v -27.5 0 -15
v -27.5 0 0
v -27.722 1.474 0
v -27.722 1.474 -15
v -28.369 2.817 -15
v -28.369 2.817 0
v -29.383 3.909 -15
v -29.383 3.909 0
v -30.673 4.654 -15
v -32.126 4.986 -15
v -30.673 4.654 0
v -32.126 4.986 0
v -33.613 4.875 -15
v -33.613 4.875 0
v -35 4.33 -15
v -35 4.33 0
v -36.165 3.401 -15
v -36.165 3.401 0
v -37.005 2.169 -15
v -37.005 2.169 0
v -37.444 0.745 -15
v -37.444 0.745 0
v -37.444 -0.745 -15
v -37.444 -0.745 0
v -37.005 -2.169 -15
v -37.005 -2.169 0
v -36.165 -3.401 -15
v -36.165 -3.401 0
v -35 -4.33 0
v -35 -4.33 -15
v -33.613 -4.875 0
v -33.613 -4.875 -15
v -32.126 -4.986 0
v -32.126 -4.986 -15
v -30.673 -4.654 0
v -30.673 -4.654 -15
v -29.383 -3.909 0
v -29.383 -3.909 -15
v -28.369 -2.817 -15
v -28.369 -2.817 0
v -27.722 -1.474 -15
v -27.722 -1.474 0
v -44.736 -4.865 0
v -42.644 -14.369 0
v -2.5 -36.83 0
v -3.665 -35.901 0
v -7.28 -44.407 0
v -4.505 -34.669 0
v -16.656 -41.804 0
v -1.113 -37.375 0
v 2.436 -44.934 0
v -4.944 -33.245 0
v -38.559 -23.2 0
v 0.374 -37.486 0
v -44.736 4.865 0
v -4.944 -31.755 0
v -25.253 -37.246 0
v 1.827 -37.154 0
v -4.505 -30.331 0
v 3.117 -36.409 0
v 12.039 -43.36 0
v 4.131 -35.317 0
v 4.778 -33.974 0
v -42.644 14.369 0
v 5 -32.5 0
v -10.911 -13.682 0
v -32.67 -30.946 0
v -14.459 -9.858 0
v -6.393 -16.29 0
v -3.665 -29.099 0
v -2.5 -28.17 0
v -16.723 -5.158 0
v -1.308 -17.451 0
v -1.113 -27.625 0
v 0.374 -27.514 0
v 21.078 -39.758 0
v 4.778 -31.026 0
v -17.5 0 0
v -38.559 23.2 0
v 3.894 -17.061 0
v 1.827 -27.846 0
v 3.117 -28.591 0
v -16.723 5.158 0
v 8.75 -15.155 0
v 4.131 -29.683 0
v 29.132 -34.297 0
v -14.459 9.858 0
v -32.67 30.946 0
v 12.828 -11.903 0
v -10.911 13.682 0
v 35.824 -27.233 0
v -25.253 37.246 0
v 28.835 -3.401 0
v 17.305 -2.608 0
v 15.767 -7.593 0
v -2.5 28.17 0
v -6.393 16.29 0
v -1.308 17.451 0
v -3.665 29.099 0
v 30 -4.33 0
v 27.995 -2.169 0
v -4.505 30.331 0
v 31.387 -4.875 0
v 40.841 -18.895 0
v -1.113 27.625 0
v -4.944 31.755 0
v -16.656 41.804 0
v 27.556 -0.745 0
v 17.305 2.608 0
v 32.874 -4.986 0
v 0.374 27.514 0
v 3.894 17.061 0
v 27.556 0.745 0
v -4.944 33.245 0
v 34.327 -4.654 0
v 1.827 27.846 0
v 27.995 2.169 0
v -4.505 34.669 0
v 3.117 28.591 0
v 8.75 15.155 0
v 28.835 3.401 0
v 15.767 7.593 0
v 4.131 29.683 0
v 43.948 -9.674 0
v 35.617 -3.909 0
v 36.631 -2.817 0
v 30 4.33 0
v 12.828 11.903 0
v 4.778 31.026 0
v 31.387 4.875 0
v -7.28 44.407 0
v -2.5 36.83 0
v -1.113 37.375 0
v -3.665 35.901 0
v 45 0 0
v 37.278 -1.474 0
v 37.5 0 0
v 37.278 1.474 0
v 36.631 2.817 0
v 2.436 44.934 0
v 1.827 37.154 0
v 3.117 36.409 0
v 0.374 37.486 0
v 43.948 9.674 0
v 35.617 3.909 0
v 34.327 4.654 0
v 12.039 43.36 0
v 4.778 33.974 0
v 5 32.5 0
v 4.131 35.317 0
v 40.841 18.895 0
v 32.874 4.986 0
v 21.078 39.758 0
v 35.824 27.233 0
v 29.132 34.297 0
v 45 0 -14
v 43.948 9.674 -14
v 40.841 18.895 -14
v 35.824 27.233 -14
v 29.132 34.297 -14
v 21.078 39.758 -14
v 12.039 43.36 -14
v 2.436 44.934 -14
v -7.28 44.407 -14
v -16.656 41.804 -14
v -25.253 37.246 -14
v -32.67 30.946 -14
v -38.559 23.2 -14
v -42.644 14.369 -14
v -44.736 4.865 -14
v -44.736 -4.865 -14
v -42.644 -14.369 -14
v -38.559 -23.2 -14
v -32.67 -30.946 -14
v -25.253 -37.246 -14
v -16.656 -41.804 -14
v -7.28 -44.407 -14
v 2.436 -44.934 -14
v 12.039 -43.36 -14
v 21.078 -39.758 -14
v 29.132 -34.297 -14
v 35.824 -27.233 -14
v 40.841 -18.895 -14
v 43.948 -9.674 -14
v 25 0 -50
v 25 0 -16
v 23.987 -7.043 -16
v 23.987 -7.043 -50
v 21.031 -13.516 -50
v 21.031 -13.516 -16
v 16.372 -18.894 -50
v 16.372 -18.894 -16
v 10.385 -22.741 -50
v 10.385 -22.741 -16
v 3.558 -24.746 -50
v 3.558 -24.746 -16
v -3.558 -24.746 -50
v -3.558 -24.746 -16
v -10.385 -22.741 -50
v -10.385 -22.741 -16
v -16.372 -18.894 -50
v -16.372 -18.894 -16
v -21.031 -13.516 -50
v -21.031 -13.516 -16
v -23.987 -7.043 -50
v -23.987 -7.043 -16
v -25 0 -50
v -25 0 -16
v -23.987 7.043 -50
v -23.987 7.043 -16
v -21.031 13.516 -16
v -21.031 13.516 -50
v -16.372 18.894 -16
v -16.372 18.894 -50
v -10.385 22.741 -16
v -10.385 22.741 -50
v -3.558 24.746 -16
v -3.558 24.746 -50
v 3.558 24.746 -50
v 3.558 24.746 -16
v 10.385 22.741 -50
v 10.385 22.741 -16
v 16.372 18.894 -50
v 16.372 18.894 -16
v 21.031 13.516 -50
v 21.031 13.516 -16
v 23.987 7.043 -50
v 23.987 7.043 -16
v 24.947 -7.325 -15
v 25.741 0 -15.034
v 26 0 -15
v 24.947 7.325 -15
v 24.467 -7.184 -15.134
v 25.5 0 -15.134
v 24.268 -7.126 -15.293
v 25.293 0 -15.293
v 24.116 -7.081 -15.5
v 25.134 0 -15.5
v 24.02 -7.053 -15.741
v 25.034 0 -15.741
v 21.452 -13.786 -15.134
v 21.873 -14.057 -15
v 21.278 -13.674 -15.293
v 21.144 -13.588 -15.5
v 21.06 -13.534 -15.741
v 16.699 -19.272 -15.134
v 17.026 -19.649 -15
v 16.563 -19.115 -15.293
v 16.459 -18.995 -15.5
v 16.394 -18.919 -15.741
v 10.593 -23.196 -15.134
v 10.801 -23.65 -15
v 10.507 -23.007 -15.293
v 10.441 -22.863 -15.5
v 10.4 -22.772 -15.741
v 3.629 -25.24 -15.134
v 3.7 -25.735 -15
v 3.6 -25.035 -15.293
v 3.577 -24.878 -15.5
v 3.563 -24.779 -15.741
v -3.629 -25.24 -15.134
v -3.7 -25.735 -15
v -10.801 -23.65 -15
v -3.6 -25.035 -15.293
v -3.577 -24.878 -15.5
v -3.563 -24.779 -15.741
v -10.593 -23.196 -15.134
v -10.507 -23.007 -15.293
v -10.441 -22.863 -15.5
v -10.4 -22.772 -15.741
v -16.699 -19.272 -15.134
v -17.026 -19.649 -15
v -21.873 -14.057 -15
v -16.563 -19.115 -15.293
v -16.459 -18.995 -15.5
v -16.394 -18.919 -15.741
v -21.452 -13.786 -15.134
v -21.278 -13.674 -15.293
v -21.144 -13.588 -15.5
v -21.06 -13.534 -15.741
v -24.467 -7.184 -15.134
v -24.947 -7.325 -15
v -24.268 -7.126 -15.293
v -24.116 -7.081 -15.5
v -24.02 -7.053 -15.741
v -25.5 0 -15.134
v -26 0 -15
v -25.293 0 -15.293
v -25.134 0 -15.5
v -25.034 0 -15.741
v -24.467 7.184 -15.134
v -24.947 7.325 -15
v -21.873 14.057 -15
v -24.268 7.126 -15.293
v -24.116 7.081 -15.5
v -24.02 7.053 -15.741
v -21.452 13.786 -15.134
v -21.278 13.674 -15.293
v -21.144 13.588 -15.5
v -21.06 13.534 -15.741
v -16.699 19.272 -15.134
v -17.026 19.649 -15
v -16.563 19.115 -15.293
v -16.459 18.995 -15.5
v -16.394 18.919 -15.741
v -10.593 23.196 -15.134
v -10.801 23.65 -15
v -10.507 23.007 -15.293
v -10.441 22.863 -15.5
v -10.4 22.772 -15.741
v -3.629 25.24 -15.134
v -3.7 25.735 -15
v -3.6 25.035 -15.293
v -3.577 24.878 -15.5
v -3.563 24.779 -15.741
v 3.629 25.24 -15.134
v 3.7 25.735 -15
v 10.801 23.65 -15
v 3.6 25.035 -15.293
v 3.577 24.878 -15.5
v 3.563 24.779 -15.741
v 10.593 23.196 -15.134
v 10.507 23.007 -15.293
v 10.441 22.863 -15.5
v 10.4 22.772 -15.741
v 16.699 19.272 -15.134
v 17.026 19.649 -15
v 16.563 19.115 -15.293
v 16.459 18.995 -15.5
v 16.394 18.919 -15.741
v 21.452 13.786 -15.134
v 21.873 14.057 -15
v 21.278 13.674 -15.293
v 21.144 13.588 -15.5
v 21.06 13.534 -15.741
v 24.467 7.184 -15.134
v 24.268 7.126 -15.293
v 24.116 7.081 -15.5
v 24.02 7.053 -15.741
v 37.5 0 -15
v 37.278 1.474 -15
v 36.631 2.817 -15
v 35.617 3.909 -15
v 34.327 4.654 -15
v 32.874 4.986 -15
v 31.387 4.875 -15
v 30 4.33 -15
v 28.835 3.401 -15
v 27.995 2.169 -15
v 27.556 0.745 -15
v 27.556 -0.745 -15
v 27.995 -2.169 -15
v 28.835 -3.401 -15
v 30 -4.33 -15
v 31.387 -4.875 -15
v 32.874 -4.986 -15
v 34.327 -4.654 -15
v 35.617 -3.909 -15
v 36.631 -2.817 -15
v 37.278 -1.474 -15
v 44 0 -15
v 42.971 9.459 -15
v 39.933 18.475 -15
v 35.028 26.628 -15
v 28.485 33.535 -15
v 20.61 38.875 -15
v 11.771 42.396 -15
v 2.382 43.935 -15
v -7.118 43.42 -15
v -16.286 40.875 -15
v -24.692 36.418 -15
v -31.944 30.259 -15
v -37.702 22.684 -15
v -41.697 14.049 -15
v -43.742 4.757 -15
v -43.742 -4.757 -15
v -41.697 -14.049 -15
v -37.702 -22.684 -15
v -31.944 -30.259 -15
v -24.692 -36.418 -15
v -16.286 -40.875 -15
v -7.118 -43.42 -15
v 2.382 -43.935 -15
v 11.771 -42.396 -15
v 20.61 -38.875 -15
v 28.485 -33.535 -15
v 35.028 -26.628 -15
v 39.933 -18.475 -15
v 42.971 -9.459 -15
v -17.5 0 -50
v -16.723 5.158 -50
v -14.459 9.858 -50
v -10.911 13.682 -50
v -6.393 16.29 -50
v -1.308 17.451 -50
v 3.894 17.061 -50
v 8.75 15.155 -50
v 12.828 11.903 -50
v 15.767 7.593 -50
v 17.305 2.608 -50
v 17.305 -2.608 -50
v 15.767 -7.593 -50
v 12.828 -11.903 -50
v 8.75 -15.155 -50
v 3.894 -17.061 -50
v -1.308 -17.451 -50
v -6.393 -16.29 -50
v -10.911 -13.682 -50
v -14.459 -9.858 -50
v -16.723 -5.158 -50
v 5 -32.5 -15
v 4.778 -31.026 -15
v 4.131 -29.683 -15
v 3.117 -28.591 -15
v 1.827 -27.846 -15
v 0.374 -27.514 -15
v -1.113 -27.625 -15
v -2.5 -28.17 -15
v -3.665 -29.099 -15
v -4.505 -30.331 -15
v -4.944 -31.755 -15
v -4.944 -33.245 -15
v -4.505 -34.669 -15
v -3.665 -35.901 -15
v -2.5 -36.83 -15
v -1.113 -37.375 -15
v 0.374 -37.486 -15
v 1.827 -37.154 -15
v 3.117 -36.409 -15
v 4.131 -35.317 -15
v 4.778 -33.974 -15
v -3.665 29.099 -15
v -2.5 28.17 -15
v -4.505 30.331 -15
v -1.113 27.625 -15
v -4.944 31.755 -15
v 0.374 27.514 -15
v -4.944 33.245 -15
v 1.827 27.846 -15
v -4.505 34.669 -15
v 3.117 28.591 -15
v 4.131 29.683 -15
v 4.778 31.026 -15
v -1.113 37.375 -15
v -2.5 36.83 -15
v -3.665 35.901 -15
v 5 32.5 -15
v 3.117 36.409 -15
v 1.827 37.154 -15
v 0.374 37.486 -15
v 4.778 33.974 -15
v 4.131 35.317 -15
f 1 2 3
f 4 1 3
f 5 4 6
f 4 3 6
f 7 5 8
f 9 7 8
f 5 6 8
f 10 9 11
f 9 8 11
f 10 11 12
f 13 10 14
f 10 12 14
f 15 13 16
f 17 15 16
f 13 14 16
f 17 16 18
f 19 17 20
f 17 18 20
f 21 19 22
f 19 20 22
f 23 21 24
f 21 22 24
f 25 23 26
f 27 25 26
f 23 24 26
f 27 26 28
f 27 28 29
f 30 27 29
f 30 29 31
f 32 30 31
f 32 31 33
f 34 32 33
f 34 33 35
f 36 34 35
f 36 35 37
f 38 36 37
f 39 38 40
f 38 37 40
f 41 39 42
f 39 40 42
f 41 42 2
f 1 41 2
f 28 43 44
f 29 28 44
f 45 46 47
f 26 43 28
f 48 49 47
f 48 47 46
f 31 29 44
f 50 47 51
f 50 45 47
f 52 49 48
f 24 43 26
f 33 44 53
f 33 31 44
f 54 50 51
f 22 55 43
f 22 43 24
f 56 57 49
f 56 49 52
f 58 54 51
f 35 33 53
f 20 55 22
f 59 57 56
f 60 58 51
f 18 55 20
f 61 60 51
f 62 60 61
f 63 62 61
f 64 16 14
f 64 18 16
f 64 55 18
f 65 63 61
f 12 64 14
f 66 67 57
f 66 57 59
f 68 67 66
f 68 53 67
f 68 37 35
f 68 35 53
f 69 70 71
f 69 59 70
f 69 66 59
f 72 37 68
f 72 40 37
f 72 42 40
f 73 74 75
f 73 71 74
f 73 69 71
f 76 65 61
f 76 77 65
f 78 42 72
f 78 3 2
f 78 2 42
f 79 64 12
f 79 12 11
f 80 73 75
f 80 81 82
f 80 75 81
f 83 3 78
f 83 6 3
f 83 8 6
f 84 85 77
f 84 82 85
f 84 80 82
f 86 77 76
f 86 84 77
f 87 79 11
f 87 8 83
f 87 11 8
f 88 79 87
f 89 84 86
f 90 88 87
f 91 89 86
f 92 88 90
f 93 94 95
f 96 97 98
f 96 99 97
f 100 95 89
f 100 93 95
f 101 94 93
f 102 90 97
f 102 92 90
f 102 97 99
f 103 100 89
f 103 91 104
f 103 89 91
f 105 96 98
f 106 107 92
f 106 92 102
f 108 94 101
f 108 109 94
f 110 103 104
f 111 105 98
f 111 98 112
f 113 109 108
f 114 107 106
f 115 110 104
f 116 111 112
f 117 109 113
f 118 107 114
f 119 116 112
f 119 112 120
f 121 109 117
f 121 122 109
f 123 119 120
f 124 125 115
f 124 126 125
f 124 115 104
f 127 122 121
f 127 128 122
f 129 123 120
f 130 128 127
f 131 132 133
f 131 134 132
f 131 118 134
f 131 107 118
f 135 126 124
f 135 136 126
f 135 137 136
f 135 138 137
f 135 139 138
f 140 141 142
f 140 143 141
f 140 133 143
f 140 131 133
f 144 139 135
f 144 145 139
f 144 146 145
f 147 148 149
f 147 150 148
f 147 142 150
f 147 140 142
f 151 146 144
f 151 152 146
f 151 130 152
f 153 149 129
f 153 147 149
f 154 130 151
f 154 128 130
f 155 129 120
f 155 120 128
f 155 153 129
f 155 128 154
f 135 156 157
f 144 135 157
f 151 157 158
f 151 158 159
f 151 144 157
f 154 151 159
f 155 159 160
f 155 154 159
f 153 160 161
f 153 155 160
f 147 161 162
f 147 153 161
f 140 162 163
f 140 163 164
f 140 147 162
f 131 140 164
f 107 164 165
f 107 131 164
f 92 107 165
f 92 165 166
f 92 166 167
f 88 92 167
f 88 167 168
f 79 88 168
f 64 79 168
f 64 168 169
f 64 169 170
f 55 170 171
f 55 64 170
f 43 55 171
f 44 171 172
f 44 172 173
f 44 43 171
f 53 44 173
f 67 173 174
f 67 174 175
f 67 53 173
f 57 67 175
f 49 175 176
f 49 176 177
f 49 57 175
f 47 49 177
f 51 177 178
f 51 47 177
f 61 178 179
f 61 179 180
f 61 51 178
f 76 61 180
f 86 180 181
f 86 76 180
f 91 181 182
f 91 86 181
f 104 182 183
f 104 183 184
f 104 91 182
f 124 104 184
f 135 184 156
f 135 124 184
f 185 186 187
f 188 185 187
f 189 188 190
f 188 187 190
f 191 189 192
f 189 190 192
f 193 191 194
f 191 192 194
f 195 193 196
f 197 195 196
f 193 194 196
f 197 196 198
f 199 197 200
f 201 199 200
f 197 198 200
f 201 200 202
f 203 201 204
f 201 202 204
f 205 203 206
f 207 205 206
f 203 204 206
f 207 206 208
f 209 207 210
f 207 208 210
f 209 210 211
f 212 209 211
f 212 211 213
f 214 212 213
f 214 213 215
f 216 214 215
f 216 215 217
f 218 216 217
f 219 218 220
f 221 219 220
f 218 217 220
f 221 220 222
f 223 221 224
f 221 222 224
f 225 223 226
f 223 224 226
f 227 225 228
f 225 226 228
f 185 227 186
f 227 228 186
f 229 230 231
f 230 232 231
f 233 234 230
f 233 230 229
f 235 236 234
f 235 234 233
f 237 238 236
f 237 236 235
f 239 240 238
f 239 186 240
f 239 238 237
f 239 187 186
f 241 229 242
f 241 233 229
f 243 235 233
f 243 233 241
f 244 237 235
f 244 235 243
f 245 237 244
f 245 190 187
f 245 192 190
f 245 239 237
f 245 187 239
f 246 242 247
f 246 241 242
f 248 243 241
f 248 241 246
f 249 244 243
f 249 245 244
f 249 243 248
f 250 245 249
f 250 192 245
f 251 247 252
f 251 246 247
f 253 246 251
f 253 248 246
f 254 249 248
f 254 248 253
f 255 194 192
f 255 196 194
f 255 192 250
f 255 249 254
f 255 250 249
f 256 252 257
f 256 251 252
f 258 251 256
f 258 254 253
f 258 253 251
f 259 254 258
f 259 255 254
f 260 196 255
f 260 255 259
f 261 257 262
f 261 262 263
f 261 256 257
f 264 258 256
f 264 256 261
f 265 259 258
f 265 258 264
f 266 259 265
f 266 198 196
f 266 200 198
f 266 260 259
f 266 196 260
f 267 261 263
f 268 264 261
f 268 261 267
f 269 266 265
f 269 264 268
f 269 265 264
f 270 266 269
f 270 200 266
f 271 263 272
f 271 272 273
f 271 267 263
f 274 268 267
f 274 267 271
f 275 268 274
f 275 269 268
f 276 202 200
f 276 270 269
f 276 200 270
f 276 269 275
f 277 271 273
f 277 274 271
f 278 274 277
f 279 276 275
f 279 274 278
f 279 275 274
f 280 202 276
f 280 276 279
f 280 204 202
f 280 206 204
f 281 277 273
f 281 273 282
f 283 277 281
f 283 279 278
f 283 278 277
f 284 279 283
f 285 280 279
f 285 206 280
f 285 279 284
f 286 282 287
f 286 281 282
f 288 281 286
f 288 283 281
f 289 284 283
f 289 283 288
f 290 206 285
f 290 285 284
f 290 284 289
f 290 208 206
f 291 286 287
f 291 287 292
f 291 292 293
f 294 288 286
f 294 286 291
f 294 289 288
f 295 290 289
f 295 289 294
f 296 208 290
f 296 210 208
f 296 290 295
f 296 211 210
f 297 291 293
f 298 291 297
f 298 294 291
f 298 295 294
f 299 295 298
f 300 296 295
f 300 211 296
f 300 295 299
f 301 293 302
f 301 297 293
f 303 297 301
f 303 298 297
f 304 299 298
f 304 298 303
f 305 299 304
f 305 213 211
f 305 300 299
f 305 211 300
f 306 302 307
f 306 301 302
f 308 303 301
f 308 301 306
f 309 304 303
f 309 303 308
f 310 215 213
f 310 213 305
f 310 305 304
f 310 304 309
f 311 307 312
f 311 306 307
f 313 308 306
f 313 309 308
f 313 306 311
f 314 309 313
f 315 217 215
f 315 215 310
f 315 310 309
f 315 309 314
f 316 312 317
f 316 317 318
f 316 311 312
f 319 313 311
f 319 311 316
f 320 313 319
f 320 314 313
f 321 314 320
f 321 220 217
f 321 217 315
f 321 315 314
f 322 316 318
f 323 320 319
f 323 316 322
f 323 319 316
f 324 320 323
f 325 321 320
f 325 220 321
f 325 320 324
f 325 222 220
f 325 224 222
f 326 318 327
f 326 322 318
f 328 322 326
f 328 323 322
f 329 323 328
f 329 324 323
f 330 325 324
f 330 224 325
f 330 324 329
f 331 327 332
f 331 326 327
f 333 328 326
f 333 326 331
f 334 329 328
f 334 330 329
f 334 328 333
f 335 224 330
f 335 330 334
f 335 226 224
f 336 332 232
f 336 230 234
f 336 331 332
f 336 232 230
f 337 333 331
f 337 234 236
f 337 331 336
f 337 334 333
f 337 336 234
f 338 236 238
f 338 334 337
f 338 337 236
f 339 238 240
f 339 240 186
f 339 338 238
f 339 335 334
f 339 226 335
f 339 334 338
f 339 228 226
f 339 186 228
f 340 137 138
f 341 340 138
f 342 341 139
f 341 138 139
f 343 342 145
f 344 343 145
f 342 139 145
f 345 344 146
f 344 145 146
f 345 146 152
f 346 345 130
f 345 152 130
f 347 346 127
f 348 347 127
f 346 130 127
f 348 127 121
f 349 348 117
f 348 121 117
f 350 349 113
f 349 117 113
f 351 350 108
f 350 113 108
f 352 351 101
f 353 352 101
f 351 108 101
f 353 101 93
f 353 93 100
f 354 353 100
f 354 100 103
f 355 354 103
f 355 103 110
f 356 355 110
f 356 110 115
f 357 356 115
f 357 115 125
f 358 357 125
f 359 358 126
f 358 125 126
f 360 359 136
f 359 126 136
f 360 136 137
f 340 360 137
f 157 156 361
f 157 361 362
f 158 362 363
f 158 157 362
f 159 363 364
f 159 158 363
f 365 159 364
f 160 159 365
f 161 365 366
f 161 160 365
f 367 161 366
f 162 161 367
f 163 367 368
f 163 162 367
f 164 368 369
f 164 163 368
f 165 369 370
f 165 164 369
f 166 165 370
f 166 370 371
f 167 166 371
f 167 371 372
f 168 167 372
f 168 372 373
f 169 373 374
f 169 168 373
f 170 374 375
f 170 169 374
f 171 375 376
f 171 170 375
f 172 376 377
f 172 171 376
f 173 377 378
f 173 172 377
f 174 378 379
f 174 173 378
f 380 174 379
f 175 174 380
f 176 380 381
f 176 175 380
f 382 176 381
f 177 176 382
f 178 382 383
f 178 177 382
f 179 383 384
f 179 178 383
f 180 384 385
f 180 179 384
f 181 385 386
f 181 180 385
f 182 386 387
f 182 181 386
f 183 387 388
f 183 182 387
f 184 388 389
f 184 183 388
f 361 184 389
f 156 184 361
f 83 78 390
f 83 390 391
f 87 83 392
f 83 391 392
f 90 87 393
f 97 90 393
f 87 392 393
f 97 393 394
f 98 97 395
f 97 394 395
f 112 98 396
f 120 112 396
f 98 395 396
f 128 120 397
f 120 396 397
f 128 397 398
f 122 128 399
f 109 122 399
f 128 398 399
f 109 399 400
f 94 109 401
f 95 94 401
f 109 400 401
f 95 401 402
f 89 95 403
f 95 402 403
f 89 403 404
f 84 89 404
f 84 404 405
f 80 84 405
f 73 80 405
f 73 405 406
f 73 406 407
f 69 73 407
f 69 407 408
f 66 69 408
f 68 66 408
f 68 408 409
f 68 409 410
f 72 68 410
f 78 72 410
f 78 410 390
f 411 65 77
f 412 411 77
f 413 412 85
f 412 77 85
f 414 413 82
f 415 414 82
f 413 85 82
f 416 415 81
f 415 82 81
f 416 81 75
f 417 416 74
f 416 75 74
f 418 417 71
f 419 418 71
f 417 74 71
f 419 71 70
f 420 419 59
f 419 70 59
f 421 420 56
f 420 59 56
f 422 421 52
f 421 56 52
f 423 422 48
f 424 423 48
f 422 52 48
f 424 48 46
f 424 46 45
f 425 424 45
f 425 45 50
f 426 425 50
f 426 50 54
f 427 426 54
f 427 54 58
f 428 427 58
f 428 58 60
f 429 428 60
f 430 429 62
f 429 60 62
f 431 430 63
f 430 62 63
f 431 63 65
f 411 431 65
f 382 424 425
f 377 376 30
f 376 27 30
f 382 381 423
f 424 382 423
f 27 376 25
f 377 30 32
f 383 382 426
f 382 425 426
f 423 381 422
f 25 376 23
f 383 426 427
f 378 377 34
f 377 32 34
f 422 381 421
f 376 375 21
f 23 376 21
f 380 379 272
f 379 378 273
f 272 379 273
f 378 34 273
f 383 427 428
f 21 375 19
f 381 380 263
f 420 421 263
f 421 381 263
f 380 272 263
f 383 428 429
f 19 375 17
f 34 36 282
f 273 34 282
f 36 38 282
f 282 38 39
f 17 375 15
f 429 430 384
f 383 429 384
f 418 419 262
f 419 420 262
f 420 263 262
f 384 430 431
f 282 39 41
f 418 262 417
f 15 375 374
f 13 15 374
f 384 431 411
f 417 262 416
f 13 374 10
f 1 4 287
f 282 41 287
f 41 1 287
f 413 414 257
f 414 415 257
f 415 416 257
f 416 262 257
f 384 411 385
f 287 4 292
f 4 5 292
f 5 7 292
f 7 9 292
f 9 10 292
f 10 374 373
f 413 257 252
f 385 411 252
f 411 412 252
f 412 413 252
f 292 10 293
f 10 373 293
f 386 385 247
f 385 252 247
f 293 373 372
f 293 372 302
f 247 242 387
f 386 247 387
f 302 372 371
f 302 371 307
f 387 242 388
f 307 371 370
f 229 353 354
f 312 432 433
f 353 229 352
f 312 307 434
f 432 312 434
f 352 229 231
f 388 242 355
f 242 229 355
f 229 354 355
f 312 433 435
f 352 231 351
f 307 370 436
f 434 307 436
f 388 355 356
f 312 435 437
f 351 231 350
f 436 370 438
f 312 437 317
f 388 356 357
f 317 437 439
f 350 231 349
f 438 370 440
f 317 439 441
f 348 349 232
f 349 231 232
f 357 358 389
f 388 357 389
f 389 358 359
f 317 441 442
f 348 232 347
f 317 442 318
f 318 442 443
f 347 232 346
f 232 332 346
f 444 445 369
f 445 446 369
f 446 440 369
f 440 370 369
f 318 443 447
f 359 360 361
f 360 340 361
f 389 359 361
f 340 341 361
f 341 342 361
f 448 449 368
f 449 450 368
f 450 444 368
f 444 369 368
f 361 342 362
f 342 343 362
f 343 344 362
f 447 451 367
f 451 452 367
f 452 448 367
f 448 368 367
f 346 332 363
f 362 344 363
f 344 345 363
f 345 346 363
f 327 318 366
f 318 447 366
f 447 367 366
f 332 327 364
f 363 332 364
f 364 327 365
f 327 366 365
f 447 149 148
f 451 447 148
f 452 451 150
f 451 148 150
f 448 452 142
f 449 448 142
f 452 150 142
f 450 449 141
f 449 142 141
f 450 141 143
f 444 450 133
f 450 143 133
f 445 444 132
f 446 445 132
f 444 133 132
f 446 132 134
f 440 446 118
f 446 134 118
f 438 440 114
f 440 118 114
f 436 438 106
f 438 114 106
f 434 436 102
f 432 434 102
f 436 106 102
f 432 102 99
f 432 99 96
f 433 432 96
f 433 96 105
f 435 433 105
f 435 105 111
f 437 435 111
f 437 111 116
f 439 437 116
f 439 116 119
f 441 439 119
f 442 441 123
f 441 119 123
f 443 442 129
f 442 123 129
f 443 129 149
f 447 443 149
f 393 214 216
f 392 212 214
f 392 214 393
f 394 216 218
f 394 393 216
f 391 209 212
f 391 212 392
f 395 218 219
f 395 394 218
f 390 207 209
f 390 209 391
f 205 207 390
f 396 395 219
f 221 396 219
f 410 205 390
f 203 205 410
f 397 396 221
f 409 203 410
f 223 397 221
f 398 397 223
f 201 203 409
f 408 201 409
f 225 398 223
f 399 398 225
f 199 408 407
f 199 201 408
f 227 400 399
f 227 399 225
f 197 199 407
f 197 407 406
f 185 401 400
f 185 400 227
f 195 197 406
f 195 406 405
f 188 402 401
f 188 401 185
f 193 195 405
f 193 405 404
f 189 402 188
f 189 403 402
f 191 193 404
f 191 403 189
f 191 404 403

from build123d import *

# Parameters (mm, degrees)
SKETCH1_R           = 45
SKETCH1_R_2         = 5
BOSS_EXTRUDE1_DEPTH = 15
SKETCH3_R           = 25
BOSS_EXTRUDE2_DEPTH = 35
FILLET1_R           = 1
CHAMFER1_SIZE       = 1
SKETCH4_R           = 17.5
CUT_EXTRUDE1_DEPTH  = 59


with BuildPart() as part:
    # Sketch1 → Boss-Extrude1 (new body)
    with BuildSketch(Plane.XY):
        Circle(SKETCH1_R)
        with Locations((0, 32.5)):
            Circle(SKETCH1_R_2, mode=Mode.SUBTRACT)
        with Locations((32.5, 0)):
            Circle(SKETCH1_R_2, mode=Mode.SUBTRACT)
        with Locations((0, -32.5)):
            Circle(SKETCH1_R_2, mode=Mode.SUBTRACT)
        with Locations((-32.5, 0)):
            Circle(SKETCH1_R_2, mode=Mode.SUBTRACT)
    extrude(amount=-BOSS_EXTRUDE1_DEPTH)

    # Sketch3 → Boss-Extrude2 (add)
    with BuildSketch(Plane(origin=(0, 0, -15), x_dir=(-1, 0, 0), z_dir=(0, 0, -1))):
        with Locations(Location((0, 0, 0), (0, 0, 180))):
            Circle(SKETCH3_R)
    extrude(amount=BOSS_EXTRUDE2_DEPTH)

    # Fillet1
    fillet1_edges = [part.edges().sort_by_distance(p)[0] for p in [
        (-25, 0, -15),
    ]]
    fillet(fillet1_edges, radius=FILLET1_R)

    # Chamfer1
    chamfer1_edges = [part.edges().sort_by_distance(p)[0] for p in [
        (-45, 0, -15),
    ]]
    chamfer(chamfer1_edges, length=CHAMFER1_SIZE)

    # Sketch4 → Cut-Extrude1 (cut)
    with BuildSketch(Plane(origin=(0, 0, -50), x_dir=(-1, 0, 0), z_dir=(0, 0, -1))):
        Circle(SKETCH4_R)
    extrude(amount=-CUT_EXTRUDE1_DEPTH, mode=Mode.SUBTRACT)


solid = part.part
